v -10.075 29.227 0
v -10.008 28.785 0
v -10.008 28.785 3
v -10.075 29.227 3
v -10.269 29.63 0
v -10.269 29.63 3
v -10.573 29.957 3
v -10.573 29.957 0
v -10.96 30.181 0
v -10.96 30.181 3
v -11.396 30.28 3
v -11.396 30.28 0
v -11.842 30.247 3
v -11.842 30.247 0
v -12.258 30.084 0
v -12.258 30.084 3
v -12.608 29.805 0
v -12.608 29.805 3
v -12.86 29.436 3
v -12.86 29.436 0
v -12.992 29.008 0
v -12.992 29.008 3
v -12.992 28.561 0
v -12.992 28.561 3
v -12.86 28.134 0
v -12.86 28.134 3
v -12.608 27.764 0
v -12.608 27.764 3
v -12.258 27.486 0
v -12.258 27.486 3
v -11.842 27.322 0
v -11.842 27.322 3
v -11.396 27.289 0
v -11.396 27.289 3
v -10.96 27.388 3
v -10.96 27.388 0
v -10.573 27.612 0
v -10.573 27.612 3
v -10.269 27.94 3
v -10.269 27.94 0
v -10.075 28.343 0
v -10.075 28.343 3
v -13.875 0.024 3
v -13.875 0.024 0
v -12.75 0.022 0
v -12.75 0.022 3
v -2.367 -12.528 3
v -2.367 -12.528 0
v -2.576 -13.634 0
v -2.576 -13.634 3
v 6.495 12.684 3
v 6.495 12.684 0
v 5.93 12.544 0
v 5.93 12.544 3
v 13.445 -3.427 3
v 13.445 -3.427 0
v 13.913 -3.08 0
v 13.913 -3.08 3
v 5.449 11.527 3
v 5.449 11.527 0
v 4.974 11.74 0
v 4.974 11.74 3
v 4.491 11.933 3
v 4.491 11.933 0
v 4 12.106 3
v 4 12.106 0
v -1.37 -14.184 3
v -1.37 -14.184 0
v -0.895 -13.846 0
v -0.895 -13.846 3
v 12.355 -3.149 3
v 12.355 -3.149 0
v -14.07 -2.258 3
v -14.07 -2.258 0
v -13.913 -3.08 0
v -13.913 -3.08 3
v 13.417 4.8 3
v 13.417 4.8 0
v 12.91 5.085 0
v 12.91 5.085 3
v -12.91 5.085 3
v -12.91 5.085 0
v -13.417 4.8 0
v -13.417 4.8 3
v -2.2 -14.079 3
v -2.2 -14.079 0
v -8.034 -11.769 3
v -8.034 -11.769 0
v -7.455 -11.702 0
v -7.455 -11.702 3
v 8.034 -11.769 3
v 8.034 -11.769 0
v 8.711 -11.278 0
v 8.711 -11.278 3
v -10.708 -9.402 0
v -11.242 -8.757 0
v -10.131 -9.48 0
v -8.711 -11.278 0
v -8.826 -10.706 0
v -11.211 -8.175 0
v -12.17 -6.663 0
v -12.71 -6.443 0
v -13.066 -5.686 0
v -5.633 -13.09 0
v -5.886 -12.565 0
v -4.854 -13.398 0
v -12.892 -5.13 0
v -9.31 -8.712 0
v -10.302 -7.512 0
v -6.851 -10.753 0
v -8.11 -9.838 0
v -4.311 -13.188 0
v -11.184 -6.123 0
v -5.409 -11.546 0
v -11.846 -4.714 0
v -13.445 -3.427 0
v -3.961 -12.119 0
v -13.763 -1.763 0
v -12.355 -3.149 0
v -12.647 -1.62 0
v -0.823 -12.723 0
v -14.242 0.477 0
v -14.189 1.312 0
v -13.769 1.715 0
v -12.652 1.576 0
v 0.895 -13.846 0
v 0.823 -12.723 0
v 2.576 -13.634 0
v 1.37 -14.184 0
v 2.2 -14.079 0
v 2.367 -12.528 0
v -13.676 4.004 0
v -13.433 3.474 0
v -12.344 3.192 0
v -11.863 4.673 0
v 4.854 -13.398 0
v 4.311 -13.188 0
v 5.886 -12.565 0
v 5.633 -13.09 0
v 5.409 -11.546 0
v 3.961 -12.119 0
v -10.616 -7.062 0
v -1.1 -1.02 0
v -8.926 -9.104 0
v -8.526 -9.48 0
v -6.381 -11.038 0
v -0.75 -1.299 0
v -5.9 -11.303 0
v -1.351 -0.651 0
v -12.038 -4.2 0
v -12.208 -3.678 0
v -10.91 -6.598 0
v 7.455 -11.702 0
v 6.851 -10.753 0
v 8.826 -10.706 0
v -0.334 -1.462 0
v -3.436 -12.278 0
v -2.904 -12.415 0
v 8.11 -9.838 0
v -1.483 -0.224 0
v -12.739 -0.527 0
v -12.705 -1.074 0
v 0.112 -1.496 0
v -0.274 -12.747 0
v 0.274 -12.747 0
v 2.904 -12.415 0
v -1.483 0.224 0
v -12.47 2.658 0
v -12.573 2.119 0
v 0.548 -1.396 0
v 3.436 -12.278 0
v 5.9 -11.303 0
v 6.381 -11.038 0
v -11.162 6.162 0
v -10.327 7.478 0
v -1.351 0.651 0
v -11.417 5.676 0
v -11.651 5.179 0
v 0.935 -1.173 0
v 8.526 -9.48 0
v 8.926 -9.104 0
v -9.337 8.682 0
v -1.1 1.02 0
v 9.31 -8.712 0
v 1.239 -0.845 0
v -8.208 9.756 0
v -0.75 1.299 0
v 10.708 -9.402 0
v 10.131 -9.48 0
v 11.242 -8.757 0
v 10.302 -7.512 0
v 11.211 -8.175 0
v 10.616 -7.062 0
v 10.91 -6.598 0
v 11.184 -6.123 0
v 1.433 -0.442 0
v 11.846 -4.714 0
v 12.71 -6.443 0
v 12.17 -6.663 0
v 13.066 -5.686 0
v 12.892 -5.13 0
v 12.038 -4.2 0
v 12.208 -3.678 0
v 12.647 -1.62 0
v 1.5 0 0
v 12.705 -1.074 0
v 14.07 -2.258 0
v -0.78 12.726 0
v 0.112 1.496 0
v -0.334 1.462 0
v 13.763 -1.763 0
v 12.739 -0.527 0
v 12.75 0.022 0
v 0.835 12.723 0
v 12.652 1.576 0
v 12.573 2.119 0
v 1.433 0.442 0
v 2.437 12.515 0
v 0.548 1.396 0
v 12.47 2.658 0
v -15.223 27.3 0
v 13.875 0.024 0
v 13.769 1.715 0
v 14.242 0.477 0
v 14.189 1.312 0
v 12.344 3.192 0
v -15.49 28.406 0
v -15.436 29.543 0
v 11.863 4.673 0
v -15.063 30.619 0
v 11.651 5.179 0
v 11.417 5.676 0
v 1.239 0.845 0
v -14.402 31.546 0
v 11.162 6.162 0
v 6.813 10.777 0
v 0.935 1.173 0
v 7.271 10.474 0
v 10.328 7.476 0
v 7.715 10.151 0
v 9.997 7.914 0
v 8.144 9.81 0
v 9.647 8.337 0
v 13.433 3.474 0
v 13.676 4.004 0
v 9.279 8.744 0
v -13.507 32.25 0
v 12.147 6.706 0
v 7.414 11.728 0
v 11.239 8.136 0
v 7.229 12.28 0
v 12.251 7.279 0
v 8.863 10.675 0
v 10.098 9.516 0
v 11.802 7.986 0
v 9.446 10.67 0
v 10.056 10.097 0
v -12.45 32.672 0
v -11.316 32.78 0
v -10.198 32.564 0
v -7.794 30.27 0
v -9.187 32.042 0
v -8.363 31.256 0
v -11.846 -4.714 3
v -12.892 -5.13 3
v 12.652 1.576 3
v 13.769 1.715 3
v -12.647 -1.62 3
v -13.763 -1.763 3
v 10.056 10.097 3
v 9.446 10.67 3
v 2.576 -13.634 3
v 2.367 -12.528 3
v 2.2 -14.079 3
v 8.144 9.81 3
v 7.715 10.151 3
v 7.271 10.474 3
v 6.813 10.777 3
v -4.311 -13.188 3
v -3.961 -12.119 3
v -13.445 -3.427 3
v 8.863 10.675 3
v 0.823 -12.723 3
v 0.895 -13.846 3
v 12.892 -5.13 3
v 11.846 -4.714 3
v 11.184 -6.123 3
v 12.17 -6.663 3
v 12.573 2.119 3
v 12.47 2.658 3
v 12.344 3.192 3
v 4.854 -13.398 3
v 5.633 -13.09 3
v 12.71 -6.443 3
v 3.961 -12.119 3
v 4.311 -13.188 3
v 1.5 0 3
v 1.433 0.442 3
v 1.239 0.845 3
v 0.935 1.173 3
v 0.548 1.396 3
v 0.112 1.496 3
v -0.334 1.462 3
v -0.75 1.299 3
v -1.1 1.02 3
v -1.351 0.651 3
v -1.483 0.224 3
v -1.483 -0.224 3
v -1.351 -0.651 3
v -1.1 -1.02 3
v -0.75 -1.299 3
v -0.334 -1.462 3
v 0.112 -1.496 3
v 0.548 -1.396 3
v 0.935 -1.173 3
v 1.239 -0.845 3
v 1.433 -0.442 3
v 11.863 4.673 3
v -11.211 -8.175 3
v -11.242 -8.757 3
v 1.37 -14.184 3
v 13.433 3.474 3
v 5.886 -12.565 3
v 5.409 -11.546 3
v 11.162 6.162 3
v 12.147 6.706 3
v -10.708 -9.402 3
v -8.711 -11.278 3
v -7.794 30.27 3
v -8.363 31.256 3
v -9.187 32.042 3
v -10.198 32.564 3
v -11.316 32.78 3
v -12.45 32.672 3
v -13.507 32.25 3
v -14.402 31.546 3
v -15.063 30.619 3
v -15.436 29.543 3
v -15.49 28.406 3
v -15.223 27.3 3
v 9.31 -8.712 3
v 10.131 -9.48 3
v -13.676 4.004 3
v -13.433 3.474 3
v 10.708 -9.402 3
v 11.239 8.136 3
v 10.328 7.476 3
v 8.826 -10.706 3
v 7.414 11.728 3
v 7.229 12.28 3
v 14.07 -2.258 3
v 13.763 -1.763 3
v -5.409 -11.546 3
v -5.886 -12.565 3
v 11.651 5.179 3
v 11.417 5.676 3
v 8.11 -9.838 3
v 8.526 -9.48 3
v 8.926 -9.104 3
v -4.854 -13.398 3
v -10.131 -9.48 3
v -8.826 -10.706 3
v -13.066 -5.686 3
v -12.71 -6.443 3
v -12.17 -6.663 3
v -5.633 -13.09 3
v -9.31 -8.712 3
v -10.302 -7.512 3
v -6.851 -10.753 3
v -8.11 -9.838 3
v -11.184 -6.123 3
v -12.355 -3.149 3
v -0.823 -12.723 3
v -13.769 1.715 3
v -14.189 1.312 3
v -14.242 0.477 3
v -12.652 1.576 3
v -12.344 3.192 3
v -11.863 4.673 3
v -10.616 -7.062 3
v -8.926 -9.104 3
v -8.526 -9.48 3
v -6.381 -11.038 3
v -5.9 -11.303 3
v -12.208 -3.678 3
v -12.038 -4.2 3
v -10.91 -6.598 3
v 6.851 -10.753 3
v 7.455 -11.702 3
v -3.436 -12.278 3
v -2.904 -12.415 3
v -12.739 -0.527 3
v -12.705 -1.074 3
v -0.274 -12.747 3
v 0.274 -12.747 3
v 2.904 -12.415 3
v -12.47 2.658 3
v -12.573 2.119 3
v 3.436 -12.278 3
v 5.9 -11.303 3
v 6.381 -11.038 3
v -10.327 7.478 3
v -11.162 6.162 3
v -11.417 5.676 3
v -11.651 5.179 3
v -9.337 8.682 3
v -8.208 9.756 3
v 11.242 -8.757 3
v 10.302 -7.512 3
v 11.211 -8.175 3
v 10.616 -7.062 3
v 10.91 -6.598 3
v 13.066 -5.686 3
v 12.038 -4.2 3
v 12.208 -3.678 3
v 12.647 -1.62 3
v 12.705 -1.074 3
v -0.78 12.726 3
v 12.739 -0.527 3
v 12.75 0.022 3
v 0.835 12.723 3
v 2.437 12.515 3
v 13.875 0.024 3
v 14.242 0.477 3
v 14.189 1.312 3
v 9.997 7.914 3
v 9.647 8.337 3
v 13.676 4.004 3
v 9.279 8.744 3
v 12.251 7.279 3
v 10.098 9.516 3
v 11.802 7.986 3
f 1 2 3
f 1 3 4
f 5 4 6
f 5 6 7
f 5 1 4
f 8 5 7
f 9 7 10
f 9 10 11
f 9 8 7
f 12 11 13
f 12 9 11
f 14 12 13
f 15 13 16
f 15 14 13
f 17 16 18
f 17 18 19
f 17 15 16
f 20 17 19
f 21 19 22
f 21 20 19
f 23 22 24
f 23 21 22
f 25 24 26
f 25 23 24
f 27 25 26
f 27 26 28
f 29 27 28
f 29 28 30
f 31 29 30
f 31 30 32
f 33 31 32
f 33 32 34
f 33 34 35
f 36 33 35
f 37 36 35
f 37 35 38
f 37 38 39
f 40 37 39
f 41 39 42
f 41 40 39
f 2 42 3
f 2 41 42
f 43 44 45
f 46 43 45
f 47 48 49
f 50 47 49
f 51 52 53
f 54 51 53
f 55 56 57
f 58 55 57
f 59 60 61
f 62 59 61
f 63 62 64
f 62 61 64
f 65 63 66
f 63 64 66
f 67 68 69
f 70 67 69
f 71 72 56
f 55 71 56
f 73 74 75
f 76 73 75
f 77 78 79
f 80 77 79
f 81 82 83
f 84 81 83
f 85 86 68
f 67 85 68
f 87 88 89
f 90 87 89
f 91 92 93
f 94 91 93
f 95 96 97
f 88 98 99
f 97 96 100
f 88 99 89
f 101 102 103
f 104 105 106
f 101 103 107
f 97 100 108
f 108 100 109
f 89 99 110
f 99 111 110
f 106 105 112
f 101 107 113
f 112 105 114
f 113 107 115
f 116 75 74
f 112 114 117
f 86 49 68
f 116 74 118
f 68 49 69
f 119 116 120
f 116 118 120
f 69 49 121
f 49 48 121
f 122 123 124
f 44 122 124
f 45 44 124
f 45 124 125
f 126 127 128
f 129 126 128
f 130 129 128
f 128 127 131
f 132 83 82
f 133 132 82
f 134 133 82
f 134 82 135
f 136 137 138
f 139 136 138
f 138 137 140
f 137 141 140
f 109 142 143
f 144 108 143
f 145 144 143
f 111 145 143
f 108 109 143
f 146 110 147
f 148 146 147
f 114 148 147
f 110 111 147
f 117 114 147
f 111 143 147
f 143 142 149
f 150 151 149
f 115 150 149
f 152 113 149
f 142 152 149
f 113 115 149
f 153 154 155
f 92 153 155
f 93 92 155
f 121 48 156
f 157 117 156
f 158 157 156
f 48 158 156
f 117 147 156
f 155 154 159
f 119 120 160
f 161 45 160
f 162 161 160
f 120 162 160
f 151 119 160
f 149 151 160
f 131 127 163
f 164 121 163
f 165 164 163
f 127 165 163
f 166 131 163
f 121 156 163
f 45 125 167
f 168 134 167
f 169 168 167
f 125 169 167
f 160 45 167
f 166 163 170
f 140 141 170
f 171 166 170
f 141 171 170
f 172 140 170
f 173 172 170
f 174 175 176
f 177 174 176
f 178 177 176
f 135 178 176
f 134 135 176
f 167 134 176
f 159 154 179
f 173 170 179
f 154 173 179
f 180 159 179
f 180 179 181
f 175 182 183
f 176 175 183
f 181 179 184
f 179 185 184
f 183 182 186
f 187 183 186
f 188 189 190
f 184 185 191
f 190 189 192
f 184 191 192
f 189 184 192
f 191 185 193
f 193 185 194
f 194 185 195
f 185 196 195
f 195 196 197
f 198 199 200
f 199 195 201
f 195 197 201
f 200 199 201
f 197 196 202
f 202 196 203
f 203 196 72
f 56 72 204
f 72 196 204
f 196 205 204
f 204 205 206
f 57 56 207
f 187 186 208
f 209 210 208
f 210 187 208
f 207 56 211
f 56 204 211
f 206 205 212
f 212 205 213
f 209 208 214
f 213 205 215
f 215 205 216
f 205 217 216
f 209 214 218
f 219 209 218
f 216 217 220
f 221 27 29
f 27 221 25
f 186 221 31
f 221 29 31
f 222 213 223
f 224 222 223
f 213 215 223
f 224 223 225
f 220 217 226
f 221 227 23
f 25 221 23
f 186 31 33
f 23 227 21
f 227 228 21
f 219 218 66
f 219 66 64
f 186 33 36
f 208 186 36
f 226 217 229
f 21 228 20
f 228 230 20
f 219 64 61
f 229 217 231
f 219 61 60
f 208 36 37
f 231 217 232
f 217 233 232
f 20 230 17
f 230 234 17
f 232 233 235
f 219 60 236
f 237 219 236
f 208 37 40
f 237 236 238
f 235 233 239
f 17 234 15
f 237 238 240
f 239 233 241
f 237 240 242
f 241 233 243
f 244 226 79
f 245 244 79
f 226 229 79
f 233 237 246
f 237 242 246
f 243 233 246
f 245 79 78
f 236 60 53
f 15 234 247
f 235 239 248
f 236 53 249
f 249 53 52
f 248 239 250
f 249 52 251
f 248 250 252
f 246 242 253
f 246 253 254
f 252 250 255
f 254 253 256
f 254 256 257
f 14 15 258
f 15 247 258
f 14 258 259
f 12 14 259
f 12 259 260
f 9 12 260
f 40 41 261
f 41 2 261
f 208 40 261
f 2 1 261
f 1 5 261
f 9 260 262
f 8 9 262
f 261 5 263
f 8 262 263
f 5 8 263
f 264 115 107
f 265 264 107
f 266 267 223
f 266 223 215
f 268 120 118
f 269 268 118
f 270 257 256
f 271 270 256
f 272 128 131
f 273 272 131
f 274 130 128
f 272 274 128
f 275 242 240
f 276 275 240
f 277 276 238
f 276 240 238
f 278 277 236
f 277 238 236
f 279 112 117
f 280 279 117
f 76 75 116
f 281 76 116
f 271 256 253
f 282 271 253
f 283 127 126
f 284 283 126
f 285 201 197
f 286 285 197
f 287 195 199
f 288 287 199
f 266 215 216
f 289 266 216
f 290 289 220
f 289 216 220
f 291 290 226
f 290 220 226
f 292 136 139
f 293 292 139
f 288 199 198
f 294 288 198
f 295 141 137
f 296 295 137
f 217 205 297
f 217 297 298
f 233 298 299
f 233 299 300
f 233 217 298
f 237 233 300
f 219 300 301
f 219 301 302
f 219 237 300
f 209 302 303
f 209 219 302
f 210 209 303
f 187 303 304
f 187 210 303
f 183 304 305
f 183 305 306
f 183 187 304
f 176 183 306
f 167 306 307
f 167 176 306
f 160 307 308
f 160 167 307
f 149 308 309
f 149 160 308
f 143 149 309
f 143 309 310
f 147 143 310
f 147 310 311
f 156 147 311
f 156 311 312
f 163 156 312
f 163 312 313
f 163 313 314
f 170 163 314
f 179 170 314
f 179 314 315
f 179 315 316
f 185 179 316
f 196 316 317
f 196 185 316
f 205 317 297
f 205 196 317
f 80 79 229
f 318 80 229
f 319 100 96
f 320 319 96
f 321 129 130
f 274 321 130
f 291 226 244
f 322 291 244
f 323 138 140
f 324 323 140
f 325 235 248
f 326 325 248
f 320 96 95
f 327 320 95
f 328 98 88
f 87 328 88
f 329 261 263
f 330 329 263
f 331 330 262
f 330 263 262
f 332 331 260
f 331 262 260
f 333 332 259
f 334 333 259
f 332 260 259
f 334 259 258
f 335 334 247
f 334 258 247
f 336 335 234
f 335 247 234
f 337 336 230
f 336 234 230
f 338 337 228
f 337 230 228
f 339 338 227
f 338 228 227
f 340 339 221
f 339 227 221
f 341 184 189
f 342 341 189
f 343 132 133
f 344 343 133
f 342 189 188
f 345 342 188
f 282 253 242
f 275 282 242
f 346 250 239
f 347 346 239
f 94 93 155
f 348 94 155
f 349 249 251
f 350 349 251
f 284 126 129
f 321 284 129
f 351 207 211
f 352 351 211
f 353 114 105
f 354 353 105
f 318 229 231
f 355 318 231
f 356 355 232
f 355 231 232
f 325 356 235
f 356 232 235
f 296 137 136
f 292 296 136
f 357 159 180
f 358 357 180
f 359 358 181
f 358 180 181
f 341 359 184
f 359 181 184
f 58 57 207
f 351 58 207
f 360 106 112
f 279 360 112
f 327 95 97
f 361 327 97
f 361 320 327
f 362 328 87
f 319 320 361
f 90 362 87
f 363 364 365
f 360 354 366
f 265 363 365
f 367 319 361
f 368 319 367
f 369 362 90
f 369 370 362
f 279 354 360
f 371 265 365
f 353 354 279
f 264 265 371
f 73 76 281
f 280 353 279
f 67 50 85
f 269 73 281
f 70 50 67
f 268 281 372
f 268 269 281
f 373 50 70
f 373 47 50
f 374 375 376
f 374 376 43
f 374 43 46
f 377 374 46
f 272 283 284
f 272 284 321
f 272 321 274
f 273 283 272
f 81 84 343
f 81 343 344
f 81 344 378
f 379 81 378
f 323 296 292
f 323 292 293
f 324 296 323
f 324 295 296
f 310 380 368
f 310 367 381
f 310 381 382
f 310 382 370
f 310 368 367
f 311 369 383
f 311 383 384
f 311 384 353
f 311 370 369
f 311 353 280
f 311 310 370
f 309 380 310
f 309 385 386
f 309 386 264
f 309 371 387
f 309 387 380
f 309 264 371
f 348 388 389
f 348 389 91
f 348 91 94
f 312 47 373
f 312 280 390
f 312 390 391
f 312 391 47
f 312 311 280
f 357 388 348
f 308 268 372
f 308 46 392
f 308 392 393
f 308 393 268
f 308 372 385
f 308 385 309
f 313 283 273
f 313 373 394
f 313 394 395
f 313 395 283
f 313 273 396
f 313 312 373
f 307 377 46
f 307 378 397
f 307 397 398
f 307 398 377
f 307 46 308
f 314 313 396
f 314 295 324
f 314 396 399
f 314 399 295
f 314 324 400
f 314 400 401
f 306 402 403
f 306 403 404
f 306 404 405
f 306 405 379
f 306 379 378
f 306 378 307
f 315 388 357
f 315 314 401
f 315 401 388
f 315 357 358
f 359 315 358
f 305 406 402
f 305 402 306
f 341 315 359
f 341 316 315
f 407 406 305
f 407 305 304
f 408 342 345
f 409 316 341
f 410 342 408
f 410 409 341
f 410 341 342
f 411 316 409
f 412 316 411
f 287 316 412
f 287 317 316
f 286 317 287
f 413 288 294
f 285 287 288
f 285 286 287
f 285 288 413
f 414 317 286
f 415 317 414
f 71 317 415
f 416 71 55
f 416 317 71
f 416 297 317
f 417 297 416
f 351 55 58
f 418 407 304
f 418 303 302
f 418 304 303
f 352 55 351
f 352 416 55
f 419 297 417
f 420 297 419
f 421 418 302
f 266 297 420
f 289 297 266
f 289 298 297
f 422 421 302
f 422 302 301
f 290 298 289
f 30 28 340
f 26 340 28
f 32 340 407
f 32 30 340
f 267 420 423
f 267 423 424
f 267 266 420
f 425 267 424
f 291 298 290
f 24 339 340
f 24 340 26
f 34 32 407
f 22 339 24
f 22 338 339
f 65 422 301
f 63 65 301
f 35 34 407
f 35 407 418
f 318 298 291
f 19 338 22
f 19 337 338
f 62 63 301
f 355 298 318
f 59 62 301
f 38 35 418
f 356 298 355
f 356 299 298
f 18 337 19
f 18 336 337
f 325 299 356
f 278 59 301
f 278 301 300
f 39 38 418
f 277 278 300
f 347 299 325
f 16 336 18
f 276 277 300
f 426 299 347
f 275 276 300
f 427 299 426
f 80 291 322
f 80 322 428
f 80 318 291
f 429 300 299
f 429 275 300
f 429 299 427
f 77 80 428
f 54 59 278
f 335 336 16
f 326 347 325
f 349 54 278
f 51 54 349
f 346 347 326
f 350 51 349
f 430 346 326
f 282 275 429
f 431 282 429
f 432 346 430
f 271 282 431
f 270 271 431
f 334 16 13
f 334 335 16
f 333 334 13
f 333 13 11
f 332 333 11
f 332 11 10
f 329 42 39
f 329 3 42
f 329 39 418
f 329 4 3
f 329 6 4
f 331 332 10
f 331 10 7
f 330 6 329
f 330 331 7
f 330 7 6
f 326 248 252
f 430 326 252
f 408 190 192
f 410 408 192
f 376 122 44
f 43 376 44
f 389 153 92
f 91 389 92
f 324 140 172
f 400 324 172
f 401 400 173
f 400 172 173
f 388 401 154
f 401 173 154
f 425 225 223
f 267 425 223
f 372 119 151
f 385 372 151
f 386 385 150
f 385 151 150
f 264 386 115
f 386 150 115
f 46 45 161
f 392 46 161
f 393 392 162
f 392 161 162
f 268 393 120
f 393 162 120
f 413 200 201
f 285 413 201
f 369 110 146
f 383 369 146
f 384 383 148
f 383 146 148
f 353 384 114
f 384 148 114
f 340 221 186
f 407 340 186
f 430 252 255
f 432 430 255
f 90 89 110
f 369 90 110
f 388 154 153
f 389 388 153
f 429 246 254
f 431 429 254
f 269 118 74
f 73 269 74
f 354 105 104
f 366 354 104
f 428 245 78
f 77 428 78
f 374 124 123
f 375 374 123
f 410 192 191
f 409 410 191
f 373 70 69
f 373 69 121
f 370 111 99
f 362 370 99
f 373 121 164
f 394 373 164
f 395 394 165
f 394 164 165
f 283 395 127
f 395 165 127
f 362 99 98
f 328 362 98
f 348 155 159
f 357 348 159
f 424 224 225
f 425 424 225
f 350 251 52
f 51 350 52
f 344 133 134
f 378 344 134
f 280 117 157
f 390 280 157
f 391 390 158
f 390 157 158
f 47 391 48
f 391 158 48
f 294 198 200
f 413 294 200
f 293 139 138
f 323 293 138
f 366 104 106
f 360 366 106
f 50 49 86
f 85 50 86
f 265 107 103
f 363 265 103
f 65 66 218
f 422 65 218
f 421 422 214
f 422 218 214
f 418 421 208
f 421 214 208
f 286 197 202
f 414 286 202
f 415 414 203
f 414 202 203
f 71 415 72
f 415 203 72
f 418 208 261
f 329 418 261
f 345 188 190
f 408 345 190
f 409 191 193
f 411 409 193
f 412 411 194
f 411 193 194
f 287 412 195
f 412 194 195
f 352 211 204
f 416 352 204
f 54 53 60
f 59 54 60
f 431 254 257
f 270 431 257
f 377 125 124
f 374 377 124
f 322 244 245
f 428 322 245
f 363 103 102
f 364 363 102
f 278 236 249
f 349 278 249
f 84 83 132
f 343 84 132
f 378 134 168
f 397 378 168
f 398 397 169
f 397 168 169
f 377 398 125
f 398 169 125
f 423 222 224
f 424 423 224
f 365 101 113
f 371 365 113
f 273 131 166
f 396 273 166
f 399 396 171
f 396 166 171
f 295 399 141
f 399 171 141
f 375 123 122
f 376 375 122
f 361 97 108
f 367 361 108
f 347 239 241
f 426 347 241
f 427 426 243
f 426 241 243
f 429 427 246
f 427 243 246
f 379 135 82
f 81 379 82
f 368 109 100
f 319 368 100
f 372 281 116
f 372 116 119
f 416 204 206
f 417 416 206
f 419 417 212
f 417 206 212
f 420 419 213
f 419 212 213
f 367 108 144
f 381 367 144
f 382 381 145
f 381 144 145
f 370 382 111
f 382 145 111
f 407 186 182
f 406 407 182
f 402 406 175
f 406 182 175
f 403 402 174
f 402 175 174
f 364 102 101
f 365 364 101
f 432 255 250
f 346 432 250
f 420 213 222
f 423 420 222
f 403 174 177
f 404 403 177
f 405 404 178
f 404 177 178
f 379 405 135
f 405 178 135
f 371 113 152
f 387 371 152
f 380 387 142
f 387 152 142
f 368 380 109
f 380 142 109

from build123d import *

# Parameters (mm, degrees)
SKETCH1_R           = 1.5
BOSS_EXTRUDE2_DEPTH = 3


with BuildPart() as part:
    # Sketch1 → Boss-Extrude2 (new body)
    with BuildSketch(Plane.XY):
        with BuildLine():
            Line((-15.222508379, 27.299729644), (-8.208462227, 9.756210733))
            ThreePointArc((-8.208462227, 9.756210733), (-9.850646229, 8.094891529), (-11.162172719, 6.161850387))
            ThreePointArc((-11.162172719, 6.161850387), (-11.536544919, 5.428685967), (-11.862823992, 4.672890641))
            Line((-11.862823992, 4.672890641), (-12.909543756, 5.085204521))
            Line((-12.909543756, 5.085204521), (-13.417390562, 4.799596912))
            Line((-13.417390562, 4.799596912), (-13.676029266, 4.003588828))
            Line((-13.676029266, 4.003588828), (-13.43304851, 3.474022556))
            Line((-13.43304851, 3.474022556), (-12.343882415, 3.192345052))
            ThreePointArc((-12.343882415, 3.192345052), (-12.524162447, 2.389111761), (-12.652232208, 1.575918828))
            Line((-12.652232208, 1.575918828), (-13.768605638, 1.71497049))
            Line((-13.768605638, 1.71497049), (-14.189469779, 1.312039404))
            Line((-14.189469779, 1.312039404), (-14.242023712, 0.476718548))
            Line((-14.242023712, 0.476718548), (-13.874978867, 0.024216431))
            Line((-13.874978867, 0.024216431), (-12.749980581, 0.022252937))
            ThreePointArc((-12.749980581, 0.022252937), (-12.724840787, -0.800579124), (-12.646654143, -1.62007376))
            Line((-12.646654143, -1.62007376), (-13.762535391, -1.763021444))
            Line((-13.762535391, -1.763021444), (-14.069972424, -2.257958364))
            Line((-14.069972424, -2.257958364), (-13.91313943, -3.080105712))
            Line((-13.91313943, -3.080105712), (-13.445093273, -3.427111302))
            Line((-13.445093273, -3.427111302), (-12.354950575, -3.149237412))
            ThreePointArc((-12.354950575, -3.149237412), (-12.125970583, -3.939966678), (-11.846440287, -4.714271155))
            Line((-11.846440287, -4.714271155), (-12.89171443, -5.130236257))
            Line((-12.89171443, -5.130236257), (-13.066406957, -5.686080305))
            Line((-13.066406957, -5.686080305), (-12.710041429, -6.443395602))
            Line((-12.710041429, -6.443395602), (-12.170403021, -6.663101027))
            Line((-12.170403021, -6.663101027), (-11.183613587, -6.122849592))
            ThreePointArc((-11.183613587, -6.122849592), (-10.76518105, -6.831791636), (-10.30187102, -7.512253556))
            Line((-10.30187102, -7.512253556), (-11.210859639, -8.175099458))
            Line((-11.210859639, -8.175099458), (-11.241831085, -8.756924908))
            Line((-11.241831085, -8.756924908), (-10.70832478, -9.401823249))
            Line((-10.70832478, -9.401823249), (-10.131001588, -9.48042361))
            Line((-10.131001588, -9.48042361), (-9.309569027, -8.711740614))
            ThreePointArc((-9.309569027, -8.711740614), (-8.727975601, -9.29435), (-8.109997309, -9.838213438))
            Line((-8.109997309, -9.838213438), (-8.825585306, -10.706291095))
            Line((-8.825585306, -10.706291095), (-8.710889622, -11.277539713))
            Line((-8.710889622, -11.277539713), (-8.033764703, -11.769499764))
            Line((-8.033764703, -11.769499764), (-7.455032066, -11.702056311))
            Line((-7.455032066, -11.702056311), (-6.850570006, -10.753240934))
            ThreePointArc((-6.850570006, -10.753240934), (-6.142359345, -11.172910171), (-5.40854264, -11.546002187))
            Line((-5.40854264, -11.546002187), (-5.885766991, -12.564767086))
            Line((-5.885766991, -12.564767086), (-5.632610928, -13.089545223))
            Line((-5.632610928, -13.089545223), (-4.854413643, -13.397655324))
            Line((-4.854413643, -13.397655324), (-4.310635461, -13.188405776))
            Line((-4.310635461, -13.188405776), (-3.961124478, -12.119075578))
            ThreePointArc((-3.961124478, -12.119075578), (-3.170796061, -12.349435304), (-2.367249346, -12.528313156))
            Line((-2.367249346, -12.528313156), (-2.576124288, -13.633752552))
            Line((-2.576124288, -13.633752552), (-2.200414573, -14.079086466))
            Line((-2.200414573, -14.079086466), (-1.370041921, -14.183986927))
            Line((-1.370041921, -14.183986927), (-0.895385777, -13.846079204))
            Line((-0.895385777, -13.846079204), (-0.82278693, -12.723424133))
            ThreePointArc((-0.82278693, -12.723424133), (0, -12.75), (0.82278693, -12.723424133))
            Line((0.82278693, -12.723424133), (0.895385777, -13.846079204))
            Line((0.895385777, -13.846079204), (1.370041921, -14.183986927))
            Line((1.370041921, -14.183986927), (2.200414573, -14.079086466))
            Line((2.200414573, -14.079086466), (2.576124288, -13.633752552))
            Line((2.576124288, -13.633752552), (2.367249346, -12.528313156))
            ThreePointArc((2.367249346, -12.528313156), (3.170796061, -12.349435304), (3.961124478, -12.119075578))
            Line((3.961124478, -12.119075578), (4.310635461, -13.188405776))
            Line((4.310635461, -13.188405776), (4.854413643, -13.397655324))
            Line((4.854413643, -13.397655324), (5.632610928, -13.089545223))
            Line((5.632610928, -13.089545223), (5.885766991, -12.564767086))
            Line((5.885766991, -12.564767086), (5.40854264, -11.546002187))
            ThreePointArc((5.40854264, -11.546002187), (6.142359345, -11.172910171), (6.850570006, -10.753240934))
            Line((6.850570006, -10.753240934), (7.455032066, -11.702056311))
            Line((7.455032066, -11.702056311), (8.033764703, -11.769499764))
            Line((8.033764703, -11.769499764), (8.710889622, -11.277539713))
            Line((8.710889622, -11.277539713), (8.825585306, -10.706291095))
            Line((8.825585306, -10.706291095), (8.109997309, -9.838213438))
            ThreePointArc((8.109997309, -9.838213438), (8.727975601, -9.29435), (9.309569027, -8.711740614))
            Line((9.309569027, -8.711740614), (10.131001588, -9.48042361))
            Line((10.131001588, -9.48042361), (10.70832478, -9.401823249))
            Line((10.70832478, -9.401823249), (11.241831085, -8.756924908))
            Line((11.241831085, -8.756924908), (11.210859639, -8.175099458))
            Line((11.210859639, -8.175099458), (10.30187102, -7.512253556))
            ThreePointArc((10.30187102, -7.512253556), (10.76518105, -6.831791636), (11.183613587, -6.122849592))
            Line((11.183613587, -6.122849592), (12.170403021, -6.663101027))
            Line((12.170403021, -6.663101027), (12.710041429, -6.443395602))
            Line((12.710041429, -6.443395602), (13.066406957, -5.686080305))
            Line((13.066406957, -5.686080305), (12.89171443, -5.130236257))
            Line((12.89171443, -5.130236257), (11.846440287, -4.714271155))
            ThreePointArc((11.846440287, -4.714271155), (12.125970583, -3.939966678), (12.354950575, -3.149237412))
            Line((12.354950575, -3.149237412), (13.445093273, -3.427111302))
            Line((13.445093273, -3.427111302), (13.91313943, -3.080105712))
            Line((13.91313943, -3.080105712), (14.069972424, -2.257958364))
            Line((14.069972424, -2.257958364), (13.762535391, -1.763021444))
            Line((13.762535391, -1.763021444), (12.646654143, -1.62007376))
            ThreePointArc((12.646654143, -1.62007376), (12.724840787, -0.800579124), (12.749980581, 0.022252937))
            Line((12.749980581, 0.022252937), (13.874978867, 0.024216431))
            Line((13.874978867, 0.024216431), (14.242023712, 0.476718548))
            Line((14.242023712, 0.476718548), (14.189469779, 1.312039404))
            Line((14.189469779, 1.312039404), (13.768605638, 1.71497049))
            Line((13.768605638, 1.71497049), (12.652232208, 1.575918828))
            ThreePointArc((12.652232208, 1.575918828), (12.524162447, 2.389111761), (12.343882415, 3.192345052))
            Line((12.343882415, 3.192345052), (13.43304851, 3.474022556))
            Line((13.43304851, 3.474022556), (13.676029266, 4.003588828))
            Line((13.676029266, 4.003588828), (13.417390562, 4.799596912))
            Line((13.417390562, 4.799596912), (12.909543756, 5.085204521))
            Line((12.909543756, 5.085204521), (11.862823992, 4.672890641))
            ThreePointArc((11.862823992, 4.672890641), (11.536544919, 5.428685967), (11.162172719, 6.161850387))
            Line((11.162172719, 6.161850387), (12.147070312, 6.705543068))
            Line((12.147070312, 6.705543068), (12.250719604, 7.278898898))
            Line((12.250719604, 7.278898898), (11.80224735, 7.985578094))
            Line((11.80224735, 7.985578094), (11.239327761, 8.13591645))
            Line((11.239327761, 8.13591645), (10.328030916, 7.476247548))
            ThreePointArc((10.328030916, 7.476247548), (9.824043845, 8.127155869), (9.27910266, 8.744184))
            Line((9.27910266, 8.744184), (10.097847012, 9.515729647))
            Line((10.097847012, 9.515729647), (10.055652175, 10.096848981))
            Line((10.055652175, 10.096848981), (9.445525531, 10.669796035))
            Line((9.445525531, 10.669796035), (8.862903468, 10.675418826))
            Line((8.862903468, 10.675418826), (8.144289673, 9.809844327))
            ThreePointArc((8.144289673, 9.809844327), (7.494261967, 10.314966678), (6.812992455, 10.777088374))
            Line((6.812992455, 10.777088374), (7.414138848, 11.728007936))
            Line((7.414138848, 11.728007936), (7.228751137, 12.280376908))
            Line((7.228751137, 12.280376908), (6.495306606, 12.683591451))
            Line((6.495306606, 12.683591451), (5.929590354, 12.544145377))
            Line((5.929590354, 12.544145377), (5.448812758, 11.527052508))
            ThreePointArc((5.448812758, 11.527052508), (4.733275563, 11.838859846), (4, 12.106300013))
            ThreePointArc((4, 12.106300013), (1.639477491, 12.644153335), (-0.78015801, 12.726109126))
            Line((-0.78015801, 12.726109126), (-7.794204162, 30.269628037))
            ThreePointArc((-7.794204162, 30.269628037), (-12.993305466, 32.498830949), (-15.222508379, 27.299729644))
        make_face()
        Circle(SKETCH1_R, mode=Mode.SUBTRACT)
        with Locations((-11.50835627, 28.784678841)):
            Circle(SKETCH1_R, mode=Mode.SUBTRACT)
    extrude(amount=BOSS_EXTRUDE2_DEPTH)


solid = part.part
